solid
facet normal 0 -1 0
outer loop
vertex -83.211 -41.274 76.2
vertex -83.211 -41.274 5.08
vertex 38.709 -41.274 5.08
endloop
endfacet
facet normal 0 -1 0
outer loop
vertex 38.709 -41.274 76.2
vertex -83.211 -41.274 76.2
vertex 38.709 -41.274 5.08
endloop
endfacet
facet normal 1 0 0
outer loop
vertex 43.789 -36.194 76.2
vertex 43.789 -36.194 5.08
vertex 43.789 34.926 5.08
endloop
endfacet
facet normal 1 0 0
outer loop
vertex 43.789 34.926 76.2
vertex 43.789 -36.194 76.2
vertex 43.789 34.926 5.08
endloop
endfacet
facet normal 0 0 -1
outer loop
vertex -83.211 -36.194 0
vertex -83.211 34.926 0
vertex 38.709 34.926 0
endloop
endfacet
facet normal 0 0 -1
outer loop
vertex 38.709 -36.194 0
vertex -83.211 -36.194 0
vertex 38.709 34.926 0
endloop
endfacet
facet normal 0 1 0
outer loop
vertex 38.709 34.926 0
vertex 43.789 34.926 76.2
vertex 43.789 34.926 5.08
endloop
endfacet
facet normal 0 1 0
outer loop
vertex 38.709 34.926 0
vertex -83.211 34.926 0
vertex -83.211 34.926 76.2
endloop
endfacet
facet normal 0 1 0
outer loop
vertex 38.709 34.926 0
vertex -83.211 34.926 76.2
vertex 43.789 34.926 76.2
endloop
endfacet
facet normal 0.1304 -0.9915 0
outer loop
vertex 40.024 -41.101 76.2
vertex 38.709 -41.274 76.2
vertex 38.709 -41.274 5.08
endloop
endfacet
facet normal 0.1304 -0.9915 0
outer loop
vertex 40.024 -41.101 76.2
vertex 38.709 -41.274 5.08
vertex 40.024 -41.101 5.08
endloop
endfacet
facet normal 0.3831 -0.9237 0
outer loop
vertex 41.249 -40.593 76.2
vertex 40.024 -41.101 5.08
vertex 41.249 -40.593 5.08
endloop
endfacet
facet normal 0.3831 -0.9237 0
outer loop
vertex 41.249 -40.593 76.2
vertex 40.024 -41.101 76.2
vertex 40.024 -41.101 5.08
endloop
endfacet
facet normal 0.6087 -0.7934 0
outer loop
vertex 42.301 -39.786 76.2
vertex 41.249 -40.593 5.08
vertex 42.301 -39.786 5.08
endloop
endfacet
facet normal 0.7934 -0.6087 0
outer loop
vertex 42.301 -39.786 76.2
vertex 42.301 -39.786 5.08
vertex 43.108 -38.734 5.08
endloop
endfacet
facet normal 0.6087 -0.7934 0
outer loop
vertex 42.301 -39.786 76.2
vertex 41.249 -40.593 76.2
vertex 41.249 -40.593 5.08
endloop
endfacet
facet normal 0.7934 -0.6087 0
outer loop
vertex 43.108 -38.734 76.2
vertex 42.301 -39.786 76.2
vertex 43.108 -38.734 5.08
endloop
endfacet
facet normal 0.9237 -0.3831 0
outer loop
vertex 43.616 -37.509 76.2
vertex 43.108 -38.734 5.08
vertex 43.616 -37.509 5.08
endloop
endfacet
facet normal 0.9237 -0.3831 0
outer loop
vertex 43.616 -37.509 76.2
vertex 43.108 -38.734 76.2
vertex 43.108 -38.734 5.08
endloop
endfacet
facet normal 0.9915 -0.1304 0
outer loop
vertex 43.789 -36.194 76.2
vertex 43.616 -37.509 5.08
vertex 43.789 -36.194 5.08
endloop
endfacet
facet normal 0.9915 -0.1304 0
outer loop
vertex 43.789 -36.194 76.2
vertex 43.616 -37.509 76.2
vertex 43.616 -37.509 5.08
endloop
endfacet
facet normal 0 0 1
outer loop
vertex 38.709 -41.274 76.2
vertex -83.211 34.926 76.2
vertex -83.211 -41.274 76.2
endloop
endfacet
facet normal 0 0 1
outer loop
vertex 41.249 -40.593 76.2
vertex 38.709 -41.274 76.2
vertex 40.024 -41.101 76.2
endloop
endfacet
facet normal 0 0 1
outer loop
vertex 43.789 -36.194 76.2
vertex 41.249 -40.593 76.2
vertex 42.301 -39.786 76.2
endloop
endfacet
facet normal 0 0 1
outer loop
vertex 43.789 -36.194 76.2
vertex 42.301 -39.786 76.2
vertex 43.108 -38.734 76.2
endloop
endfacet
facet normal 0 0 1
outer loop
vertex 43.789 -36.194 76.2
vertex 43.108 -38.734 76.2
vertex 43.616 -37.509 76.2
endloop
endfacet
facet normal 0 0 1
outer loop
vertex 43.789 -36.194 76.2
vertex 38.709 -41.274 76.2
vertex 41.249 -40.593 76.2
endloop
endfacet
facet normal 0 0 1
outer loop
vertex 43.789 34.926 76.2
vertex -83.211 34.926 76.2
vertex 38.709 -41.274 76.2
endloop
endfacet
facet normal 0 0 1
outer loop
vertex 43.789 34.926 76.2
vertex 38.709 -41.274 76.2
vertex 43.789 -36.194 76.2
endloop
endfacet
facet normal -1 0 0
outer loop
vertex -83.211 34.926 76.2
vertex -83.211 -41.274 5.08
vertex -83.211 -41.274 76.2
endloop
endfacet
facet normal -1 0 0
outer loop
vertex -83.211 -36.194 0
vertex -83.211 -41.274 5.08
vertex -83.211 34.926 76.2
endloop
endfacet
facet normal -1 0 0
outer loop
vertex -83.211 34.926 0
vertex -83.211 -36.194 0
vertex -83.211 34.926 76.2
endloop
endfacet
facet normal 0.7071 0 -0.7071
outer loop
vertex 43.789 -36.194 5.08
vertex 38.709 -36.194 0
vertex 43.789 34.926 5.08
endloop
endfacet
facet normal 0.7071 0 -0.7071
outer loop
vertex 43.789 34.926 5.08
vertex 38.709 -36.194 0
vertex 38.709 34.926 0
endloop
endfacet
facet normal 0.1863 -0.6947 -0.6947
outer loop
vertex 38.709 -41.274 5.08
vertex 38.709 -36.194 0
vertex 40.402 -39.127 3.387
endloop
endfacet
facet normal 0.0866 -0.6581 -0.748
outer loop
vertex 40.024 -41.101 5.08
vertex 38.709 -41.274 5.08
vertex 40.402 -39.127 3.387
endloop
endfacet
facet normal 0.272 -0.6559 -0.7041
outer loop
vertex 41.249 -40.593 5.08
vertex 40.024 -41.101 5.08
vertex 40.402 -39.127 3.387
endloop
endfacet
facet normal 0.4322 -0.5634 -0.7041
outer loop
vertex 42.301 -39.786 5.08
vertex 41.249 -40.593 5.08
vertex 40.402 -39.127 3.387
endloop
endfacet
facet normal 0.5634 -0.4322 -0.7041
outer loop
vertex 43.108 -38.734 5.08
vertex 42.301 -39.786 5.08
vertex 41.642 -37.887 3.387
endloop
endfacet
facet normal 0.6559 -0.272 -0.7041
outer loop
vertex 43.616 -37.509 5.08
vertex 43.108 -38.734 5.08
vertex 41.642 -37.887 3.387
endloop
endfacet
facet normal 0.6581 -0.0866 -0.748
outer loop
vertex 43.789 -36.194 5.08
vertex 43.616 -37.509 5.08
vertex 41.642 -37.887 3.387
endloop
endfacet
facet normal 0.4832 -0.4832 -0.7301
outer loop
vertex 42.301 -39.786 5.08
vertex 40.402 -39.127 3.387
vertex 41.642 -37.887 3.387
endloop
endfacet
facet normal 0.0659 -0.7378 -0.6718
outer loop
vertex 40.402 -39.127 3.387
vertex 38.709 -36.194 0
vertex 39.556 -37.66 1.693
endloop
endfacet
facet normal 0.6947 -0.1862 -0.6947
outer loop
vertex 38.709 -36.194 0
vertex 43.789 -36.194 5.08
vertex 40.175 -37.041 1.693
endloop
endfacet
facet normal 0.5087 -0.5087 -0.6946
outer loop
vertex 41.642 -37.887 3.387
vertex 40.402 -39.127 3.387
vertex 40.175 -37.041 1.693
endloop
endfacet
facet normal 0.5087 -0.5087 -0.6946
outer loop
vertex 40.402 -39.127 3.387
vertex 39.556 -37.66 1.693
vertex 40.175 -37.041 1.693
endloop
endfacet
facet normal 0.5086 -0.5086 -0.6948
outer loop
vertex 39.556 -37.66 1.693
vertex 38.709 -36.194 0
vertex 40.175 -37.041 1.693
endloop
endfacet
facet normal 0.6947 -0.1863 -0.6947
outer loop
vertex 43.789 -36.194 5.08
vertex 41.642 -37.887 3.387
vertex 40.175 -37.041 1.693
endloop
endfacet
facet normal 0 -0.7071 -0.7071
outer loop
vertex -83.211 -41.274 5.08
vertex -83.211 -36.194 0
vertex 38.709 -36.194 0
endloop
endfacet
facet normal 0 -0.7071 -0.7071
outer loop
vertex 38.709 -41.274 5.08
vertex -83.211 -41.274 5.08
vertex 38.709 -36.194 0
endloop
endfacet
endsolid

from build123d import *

# Parameters (mm, degrees)
F0_W     = 127
F0_H     = 76.2
F1_DEPTH = 76.2
F2_W     = 25.4
F2_H     = 12.7
F3_DEPTH = 12.7
F4_R     = 5.08
F5_SIZE  = 5.08


with BuildPart() as f1:
    # F0 (on Top) → F1 (new body)
    with BuildSketch(Plane.XY):
        with Locations((-19.711085, -3.173979)):
            Rectangle(F0_W, F0_H)
    extrude(amount=F1_DEPTH)

    # F2 (on face) → F3 (join)
    with BuildSketch(Plane.XY.offset(76.2)):
        with Locations((-19.711085, -6.35)):
            Rectangle(F2_W, F2_H)
    extrude(amount=-F3_DEPTH)

    # F4
    f4_edges = [f1.edges().sort_by_distance(p)[0] for p in [
        (43.788915, -41.273979, 38.1),
    ]]
    fillet(f4_edges, radius=F4_R)

    # F5
    f5_edges = [f1.edges().sort_by_distance(p)[0] for p in [
        (-22.251085, -41.273979, 0),
    ]]
    chamfer(f5_edges, length=F5_SIZE)


solid = f1.part
